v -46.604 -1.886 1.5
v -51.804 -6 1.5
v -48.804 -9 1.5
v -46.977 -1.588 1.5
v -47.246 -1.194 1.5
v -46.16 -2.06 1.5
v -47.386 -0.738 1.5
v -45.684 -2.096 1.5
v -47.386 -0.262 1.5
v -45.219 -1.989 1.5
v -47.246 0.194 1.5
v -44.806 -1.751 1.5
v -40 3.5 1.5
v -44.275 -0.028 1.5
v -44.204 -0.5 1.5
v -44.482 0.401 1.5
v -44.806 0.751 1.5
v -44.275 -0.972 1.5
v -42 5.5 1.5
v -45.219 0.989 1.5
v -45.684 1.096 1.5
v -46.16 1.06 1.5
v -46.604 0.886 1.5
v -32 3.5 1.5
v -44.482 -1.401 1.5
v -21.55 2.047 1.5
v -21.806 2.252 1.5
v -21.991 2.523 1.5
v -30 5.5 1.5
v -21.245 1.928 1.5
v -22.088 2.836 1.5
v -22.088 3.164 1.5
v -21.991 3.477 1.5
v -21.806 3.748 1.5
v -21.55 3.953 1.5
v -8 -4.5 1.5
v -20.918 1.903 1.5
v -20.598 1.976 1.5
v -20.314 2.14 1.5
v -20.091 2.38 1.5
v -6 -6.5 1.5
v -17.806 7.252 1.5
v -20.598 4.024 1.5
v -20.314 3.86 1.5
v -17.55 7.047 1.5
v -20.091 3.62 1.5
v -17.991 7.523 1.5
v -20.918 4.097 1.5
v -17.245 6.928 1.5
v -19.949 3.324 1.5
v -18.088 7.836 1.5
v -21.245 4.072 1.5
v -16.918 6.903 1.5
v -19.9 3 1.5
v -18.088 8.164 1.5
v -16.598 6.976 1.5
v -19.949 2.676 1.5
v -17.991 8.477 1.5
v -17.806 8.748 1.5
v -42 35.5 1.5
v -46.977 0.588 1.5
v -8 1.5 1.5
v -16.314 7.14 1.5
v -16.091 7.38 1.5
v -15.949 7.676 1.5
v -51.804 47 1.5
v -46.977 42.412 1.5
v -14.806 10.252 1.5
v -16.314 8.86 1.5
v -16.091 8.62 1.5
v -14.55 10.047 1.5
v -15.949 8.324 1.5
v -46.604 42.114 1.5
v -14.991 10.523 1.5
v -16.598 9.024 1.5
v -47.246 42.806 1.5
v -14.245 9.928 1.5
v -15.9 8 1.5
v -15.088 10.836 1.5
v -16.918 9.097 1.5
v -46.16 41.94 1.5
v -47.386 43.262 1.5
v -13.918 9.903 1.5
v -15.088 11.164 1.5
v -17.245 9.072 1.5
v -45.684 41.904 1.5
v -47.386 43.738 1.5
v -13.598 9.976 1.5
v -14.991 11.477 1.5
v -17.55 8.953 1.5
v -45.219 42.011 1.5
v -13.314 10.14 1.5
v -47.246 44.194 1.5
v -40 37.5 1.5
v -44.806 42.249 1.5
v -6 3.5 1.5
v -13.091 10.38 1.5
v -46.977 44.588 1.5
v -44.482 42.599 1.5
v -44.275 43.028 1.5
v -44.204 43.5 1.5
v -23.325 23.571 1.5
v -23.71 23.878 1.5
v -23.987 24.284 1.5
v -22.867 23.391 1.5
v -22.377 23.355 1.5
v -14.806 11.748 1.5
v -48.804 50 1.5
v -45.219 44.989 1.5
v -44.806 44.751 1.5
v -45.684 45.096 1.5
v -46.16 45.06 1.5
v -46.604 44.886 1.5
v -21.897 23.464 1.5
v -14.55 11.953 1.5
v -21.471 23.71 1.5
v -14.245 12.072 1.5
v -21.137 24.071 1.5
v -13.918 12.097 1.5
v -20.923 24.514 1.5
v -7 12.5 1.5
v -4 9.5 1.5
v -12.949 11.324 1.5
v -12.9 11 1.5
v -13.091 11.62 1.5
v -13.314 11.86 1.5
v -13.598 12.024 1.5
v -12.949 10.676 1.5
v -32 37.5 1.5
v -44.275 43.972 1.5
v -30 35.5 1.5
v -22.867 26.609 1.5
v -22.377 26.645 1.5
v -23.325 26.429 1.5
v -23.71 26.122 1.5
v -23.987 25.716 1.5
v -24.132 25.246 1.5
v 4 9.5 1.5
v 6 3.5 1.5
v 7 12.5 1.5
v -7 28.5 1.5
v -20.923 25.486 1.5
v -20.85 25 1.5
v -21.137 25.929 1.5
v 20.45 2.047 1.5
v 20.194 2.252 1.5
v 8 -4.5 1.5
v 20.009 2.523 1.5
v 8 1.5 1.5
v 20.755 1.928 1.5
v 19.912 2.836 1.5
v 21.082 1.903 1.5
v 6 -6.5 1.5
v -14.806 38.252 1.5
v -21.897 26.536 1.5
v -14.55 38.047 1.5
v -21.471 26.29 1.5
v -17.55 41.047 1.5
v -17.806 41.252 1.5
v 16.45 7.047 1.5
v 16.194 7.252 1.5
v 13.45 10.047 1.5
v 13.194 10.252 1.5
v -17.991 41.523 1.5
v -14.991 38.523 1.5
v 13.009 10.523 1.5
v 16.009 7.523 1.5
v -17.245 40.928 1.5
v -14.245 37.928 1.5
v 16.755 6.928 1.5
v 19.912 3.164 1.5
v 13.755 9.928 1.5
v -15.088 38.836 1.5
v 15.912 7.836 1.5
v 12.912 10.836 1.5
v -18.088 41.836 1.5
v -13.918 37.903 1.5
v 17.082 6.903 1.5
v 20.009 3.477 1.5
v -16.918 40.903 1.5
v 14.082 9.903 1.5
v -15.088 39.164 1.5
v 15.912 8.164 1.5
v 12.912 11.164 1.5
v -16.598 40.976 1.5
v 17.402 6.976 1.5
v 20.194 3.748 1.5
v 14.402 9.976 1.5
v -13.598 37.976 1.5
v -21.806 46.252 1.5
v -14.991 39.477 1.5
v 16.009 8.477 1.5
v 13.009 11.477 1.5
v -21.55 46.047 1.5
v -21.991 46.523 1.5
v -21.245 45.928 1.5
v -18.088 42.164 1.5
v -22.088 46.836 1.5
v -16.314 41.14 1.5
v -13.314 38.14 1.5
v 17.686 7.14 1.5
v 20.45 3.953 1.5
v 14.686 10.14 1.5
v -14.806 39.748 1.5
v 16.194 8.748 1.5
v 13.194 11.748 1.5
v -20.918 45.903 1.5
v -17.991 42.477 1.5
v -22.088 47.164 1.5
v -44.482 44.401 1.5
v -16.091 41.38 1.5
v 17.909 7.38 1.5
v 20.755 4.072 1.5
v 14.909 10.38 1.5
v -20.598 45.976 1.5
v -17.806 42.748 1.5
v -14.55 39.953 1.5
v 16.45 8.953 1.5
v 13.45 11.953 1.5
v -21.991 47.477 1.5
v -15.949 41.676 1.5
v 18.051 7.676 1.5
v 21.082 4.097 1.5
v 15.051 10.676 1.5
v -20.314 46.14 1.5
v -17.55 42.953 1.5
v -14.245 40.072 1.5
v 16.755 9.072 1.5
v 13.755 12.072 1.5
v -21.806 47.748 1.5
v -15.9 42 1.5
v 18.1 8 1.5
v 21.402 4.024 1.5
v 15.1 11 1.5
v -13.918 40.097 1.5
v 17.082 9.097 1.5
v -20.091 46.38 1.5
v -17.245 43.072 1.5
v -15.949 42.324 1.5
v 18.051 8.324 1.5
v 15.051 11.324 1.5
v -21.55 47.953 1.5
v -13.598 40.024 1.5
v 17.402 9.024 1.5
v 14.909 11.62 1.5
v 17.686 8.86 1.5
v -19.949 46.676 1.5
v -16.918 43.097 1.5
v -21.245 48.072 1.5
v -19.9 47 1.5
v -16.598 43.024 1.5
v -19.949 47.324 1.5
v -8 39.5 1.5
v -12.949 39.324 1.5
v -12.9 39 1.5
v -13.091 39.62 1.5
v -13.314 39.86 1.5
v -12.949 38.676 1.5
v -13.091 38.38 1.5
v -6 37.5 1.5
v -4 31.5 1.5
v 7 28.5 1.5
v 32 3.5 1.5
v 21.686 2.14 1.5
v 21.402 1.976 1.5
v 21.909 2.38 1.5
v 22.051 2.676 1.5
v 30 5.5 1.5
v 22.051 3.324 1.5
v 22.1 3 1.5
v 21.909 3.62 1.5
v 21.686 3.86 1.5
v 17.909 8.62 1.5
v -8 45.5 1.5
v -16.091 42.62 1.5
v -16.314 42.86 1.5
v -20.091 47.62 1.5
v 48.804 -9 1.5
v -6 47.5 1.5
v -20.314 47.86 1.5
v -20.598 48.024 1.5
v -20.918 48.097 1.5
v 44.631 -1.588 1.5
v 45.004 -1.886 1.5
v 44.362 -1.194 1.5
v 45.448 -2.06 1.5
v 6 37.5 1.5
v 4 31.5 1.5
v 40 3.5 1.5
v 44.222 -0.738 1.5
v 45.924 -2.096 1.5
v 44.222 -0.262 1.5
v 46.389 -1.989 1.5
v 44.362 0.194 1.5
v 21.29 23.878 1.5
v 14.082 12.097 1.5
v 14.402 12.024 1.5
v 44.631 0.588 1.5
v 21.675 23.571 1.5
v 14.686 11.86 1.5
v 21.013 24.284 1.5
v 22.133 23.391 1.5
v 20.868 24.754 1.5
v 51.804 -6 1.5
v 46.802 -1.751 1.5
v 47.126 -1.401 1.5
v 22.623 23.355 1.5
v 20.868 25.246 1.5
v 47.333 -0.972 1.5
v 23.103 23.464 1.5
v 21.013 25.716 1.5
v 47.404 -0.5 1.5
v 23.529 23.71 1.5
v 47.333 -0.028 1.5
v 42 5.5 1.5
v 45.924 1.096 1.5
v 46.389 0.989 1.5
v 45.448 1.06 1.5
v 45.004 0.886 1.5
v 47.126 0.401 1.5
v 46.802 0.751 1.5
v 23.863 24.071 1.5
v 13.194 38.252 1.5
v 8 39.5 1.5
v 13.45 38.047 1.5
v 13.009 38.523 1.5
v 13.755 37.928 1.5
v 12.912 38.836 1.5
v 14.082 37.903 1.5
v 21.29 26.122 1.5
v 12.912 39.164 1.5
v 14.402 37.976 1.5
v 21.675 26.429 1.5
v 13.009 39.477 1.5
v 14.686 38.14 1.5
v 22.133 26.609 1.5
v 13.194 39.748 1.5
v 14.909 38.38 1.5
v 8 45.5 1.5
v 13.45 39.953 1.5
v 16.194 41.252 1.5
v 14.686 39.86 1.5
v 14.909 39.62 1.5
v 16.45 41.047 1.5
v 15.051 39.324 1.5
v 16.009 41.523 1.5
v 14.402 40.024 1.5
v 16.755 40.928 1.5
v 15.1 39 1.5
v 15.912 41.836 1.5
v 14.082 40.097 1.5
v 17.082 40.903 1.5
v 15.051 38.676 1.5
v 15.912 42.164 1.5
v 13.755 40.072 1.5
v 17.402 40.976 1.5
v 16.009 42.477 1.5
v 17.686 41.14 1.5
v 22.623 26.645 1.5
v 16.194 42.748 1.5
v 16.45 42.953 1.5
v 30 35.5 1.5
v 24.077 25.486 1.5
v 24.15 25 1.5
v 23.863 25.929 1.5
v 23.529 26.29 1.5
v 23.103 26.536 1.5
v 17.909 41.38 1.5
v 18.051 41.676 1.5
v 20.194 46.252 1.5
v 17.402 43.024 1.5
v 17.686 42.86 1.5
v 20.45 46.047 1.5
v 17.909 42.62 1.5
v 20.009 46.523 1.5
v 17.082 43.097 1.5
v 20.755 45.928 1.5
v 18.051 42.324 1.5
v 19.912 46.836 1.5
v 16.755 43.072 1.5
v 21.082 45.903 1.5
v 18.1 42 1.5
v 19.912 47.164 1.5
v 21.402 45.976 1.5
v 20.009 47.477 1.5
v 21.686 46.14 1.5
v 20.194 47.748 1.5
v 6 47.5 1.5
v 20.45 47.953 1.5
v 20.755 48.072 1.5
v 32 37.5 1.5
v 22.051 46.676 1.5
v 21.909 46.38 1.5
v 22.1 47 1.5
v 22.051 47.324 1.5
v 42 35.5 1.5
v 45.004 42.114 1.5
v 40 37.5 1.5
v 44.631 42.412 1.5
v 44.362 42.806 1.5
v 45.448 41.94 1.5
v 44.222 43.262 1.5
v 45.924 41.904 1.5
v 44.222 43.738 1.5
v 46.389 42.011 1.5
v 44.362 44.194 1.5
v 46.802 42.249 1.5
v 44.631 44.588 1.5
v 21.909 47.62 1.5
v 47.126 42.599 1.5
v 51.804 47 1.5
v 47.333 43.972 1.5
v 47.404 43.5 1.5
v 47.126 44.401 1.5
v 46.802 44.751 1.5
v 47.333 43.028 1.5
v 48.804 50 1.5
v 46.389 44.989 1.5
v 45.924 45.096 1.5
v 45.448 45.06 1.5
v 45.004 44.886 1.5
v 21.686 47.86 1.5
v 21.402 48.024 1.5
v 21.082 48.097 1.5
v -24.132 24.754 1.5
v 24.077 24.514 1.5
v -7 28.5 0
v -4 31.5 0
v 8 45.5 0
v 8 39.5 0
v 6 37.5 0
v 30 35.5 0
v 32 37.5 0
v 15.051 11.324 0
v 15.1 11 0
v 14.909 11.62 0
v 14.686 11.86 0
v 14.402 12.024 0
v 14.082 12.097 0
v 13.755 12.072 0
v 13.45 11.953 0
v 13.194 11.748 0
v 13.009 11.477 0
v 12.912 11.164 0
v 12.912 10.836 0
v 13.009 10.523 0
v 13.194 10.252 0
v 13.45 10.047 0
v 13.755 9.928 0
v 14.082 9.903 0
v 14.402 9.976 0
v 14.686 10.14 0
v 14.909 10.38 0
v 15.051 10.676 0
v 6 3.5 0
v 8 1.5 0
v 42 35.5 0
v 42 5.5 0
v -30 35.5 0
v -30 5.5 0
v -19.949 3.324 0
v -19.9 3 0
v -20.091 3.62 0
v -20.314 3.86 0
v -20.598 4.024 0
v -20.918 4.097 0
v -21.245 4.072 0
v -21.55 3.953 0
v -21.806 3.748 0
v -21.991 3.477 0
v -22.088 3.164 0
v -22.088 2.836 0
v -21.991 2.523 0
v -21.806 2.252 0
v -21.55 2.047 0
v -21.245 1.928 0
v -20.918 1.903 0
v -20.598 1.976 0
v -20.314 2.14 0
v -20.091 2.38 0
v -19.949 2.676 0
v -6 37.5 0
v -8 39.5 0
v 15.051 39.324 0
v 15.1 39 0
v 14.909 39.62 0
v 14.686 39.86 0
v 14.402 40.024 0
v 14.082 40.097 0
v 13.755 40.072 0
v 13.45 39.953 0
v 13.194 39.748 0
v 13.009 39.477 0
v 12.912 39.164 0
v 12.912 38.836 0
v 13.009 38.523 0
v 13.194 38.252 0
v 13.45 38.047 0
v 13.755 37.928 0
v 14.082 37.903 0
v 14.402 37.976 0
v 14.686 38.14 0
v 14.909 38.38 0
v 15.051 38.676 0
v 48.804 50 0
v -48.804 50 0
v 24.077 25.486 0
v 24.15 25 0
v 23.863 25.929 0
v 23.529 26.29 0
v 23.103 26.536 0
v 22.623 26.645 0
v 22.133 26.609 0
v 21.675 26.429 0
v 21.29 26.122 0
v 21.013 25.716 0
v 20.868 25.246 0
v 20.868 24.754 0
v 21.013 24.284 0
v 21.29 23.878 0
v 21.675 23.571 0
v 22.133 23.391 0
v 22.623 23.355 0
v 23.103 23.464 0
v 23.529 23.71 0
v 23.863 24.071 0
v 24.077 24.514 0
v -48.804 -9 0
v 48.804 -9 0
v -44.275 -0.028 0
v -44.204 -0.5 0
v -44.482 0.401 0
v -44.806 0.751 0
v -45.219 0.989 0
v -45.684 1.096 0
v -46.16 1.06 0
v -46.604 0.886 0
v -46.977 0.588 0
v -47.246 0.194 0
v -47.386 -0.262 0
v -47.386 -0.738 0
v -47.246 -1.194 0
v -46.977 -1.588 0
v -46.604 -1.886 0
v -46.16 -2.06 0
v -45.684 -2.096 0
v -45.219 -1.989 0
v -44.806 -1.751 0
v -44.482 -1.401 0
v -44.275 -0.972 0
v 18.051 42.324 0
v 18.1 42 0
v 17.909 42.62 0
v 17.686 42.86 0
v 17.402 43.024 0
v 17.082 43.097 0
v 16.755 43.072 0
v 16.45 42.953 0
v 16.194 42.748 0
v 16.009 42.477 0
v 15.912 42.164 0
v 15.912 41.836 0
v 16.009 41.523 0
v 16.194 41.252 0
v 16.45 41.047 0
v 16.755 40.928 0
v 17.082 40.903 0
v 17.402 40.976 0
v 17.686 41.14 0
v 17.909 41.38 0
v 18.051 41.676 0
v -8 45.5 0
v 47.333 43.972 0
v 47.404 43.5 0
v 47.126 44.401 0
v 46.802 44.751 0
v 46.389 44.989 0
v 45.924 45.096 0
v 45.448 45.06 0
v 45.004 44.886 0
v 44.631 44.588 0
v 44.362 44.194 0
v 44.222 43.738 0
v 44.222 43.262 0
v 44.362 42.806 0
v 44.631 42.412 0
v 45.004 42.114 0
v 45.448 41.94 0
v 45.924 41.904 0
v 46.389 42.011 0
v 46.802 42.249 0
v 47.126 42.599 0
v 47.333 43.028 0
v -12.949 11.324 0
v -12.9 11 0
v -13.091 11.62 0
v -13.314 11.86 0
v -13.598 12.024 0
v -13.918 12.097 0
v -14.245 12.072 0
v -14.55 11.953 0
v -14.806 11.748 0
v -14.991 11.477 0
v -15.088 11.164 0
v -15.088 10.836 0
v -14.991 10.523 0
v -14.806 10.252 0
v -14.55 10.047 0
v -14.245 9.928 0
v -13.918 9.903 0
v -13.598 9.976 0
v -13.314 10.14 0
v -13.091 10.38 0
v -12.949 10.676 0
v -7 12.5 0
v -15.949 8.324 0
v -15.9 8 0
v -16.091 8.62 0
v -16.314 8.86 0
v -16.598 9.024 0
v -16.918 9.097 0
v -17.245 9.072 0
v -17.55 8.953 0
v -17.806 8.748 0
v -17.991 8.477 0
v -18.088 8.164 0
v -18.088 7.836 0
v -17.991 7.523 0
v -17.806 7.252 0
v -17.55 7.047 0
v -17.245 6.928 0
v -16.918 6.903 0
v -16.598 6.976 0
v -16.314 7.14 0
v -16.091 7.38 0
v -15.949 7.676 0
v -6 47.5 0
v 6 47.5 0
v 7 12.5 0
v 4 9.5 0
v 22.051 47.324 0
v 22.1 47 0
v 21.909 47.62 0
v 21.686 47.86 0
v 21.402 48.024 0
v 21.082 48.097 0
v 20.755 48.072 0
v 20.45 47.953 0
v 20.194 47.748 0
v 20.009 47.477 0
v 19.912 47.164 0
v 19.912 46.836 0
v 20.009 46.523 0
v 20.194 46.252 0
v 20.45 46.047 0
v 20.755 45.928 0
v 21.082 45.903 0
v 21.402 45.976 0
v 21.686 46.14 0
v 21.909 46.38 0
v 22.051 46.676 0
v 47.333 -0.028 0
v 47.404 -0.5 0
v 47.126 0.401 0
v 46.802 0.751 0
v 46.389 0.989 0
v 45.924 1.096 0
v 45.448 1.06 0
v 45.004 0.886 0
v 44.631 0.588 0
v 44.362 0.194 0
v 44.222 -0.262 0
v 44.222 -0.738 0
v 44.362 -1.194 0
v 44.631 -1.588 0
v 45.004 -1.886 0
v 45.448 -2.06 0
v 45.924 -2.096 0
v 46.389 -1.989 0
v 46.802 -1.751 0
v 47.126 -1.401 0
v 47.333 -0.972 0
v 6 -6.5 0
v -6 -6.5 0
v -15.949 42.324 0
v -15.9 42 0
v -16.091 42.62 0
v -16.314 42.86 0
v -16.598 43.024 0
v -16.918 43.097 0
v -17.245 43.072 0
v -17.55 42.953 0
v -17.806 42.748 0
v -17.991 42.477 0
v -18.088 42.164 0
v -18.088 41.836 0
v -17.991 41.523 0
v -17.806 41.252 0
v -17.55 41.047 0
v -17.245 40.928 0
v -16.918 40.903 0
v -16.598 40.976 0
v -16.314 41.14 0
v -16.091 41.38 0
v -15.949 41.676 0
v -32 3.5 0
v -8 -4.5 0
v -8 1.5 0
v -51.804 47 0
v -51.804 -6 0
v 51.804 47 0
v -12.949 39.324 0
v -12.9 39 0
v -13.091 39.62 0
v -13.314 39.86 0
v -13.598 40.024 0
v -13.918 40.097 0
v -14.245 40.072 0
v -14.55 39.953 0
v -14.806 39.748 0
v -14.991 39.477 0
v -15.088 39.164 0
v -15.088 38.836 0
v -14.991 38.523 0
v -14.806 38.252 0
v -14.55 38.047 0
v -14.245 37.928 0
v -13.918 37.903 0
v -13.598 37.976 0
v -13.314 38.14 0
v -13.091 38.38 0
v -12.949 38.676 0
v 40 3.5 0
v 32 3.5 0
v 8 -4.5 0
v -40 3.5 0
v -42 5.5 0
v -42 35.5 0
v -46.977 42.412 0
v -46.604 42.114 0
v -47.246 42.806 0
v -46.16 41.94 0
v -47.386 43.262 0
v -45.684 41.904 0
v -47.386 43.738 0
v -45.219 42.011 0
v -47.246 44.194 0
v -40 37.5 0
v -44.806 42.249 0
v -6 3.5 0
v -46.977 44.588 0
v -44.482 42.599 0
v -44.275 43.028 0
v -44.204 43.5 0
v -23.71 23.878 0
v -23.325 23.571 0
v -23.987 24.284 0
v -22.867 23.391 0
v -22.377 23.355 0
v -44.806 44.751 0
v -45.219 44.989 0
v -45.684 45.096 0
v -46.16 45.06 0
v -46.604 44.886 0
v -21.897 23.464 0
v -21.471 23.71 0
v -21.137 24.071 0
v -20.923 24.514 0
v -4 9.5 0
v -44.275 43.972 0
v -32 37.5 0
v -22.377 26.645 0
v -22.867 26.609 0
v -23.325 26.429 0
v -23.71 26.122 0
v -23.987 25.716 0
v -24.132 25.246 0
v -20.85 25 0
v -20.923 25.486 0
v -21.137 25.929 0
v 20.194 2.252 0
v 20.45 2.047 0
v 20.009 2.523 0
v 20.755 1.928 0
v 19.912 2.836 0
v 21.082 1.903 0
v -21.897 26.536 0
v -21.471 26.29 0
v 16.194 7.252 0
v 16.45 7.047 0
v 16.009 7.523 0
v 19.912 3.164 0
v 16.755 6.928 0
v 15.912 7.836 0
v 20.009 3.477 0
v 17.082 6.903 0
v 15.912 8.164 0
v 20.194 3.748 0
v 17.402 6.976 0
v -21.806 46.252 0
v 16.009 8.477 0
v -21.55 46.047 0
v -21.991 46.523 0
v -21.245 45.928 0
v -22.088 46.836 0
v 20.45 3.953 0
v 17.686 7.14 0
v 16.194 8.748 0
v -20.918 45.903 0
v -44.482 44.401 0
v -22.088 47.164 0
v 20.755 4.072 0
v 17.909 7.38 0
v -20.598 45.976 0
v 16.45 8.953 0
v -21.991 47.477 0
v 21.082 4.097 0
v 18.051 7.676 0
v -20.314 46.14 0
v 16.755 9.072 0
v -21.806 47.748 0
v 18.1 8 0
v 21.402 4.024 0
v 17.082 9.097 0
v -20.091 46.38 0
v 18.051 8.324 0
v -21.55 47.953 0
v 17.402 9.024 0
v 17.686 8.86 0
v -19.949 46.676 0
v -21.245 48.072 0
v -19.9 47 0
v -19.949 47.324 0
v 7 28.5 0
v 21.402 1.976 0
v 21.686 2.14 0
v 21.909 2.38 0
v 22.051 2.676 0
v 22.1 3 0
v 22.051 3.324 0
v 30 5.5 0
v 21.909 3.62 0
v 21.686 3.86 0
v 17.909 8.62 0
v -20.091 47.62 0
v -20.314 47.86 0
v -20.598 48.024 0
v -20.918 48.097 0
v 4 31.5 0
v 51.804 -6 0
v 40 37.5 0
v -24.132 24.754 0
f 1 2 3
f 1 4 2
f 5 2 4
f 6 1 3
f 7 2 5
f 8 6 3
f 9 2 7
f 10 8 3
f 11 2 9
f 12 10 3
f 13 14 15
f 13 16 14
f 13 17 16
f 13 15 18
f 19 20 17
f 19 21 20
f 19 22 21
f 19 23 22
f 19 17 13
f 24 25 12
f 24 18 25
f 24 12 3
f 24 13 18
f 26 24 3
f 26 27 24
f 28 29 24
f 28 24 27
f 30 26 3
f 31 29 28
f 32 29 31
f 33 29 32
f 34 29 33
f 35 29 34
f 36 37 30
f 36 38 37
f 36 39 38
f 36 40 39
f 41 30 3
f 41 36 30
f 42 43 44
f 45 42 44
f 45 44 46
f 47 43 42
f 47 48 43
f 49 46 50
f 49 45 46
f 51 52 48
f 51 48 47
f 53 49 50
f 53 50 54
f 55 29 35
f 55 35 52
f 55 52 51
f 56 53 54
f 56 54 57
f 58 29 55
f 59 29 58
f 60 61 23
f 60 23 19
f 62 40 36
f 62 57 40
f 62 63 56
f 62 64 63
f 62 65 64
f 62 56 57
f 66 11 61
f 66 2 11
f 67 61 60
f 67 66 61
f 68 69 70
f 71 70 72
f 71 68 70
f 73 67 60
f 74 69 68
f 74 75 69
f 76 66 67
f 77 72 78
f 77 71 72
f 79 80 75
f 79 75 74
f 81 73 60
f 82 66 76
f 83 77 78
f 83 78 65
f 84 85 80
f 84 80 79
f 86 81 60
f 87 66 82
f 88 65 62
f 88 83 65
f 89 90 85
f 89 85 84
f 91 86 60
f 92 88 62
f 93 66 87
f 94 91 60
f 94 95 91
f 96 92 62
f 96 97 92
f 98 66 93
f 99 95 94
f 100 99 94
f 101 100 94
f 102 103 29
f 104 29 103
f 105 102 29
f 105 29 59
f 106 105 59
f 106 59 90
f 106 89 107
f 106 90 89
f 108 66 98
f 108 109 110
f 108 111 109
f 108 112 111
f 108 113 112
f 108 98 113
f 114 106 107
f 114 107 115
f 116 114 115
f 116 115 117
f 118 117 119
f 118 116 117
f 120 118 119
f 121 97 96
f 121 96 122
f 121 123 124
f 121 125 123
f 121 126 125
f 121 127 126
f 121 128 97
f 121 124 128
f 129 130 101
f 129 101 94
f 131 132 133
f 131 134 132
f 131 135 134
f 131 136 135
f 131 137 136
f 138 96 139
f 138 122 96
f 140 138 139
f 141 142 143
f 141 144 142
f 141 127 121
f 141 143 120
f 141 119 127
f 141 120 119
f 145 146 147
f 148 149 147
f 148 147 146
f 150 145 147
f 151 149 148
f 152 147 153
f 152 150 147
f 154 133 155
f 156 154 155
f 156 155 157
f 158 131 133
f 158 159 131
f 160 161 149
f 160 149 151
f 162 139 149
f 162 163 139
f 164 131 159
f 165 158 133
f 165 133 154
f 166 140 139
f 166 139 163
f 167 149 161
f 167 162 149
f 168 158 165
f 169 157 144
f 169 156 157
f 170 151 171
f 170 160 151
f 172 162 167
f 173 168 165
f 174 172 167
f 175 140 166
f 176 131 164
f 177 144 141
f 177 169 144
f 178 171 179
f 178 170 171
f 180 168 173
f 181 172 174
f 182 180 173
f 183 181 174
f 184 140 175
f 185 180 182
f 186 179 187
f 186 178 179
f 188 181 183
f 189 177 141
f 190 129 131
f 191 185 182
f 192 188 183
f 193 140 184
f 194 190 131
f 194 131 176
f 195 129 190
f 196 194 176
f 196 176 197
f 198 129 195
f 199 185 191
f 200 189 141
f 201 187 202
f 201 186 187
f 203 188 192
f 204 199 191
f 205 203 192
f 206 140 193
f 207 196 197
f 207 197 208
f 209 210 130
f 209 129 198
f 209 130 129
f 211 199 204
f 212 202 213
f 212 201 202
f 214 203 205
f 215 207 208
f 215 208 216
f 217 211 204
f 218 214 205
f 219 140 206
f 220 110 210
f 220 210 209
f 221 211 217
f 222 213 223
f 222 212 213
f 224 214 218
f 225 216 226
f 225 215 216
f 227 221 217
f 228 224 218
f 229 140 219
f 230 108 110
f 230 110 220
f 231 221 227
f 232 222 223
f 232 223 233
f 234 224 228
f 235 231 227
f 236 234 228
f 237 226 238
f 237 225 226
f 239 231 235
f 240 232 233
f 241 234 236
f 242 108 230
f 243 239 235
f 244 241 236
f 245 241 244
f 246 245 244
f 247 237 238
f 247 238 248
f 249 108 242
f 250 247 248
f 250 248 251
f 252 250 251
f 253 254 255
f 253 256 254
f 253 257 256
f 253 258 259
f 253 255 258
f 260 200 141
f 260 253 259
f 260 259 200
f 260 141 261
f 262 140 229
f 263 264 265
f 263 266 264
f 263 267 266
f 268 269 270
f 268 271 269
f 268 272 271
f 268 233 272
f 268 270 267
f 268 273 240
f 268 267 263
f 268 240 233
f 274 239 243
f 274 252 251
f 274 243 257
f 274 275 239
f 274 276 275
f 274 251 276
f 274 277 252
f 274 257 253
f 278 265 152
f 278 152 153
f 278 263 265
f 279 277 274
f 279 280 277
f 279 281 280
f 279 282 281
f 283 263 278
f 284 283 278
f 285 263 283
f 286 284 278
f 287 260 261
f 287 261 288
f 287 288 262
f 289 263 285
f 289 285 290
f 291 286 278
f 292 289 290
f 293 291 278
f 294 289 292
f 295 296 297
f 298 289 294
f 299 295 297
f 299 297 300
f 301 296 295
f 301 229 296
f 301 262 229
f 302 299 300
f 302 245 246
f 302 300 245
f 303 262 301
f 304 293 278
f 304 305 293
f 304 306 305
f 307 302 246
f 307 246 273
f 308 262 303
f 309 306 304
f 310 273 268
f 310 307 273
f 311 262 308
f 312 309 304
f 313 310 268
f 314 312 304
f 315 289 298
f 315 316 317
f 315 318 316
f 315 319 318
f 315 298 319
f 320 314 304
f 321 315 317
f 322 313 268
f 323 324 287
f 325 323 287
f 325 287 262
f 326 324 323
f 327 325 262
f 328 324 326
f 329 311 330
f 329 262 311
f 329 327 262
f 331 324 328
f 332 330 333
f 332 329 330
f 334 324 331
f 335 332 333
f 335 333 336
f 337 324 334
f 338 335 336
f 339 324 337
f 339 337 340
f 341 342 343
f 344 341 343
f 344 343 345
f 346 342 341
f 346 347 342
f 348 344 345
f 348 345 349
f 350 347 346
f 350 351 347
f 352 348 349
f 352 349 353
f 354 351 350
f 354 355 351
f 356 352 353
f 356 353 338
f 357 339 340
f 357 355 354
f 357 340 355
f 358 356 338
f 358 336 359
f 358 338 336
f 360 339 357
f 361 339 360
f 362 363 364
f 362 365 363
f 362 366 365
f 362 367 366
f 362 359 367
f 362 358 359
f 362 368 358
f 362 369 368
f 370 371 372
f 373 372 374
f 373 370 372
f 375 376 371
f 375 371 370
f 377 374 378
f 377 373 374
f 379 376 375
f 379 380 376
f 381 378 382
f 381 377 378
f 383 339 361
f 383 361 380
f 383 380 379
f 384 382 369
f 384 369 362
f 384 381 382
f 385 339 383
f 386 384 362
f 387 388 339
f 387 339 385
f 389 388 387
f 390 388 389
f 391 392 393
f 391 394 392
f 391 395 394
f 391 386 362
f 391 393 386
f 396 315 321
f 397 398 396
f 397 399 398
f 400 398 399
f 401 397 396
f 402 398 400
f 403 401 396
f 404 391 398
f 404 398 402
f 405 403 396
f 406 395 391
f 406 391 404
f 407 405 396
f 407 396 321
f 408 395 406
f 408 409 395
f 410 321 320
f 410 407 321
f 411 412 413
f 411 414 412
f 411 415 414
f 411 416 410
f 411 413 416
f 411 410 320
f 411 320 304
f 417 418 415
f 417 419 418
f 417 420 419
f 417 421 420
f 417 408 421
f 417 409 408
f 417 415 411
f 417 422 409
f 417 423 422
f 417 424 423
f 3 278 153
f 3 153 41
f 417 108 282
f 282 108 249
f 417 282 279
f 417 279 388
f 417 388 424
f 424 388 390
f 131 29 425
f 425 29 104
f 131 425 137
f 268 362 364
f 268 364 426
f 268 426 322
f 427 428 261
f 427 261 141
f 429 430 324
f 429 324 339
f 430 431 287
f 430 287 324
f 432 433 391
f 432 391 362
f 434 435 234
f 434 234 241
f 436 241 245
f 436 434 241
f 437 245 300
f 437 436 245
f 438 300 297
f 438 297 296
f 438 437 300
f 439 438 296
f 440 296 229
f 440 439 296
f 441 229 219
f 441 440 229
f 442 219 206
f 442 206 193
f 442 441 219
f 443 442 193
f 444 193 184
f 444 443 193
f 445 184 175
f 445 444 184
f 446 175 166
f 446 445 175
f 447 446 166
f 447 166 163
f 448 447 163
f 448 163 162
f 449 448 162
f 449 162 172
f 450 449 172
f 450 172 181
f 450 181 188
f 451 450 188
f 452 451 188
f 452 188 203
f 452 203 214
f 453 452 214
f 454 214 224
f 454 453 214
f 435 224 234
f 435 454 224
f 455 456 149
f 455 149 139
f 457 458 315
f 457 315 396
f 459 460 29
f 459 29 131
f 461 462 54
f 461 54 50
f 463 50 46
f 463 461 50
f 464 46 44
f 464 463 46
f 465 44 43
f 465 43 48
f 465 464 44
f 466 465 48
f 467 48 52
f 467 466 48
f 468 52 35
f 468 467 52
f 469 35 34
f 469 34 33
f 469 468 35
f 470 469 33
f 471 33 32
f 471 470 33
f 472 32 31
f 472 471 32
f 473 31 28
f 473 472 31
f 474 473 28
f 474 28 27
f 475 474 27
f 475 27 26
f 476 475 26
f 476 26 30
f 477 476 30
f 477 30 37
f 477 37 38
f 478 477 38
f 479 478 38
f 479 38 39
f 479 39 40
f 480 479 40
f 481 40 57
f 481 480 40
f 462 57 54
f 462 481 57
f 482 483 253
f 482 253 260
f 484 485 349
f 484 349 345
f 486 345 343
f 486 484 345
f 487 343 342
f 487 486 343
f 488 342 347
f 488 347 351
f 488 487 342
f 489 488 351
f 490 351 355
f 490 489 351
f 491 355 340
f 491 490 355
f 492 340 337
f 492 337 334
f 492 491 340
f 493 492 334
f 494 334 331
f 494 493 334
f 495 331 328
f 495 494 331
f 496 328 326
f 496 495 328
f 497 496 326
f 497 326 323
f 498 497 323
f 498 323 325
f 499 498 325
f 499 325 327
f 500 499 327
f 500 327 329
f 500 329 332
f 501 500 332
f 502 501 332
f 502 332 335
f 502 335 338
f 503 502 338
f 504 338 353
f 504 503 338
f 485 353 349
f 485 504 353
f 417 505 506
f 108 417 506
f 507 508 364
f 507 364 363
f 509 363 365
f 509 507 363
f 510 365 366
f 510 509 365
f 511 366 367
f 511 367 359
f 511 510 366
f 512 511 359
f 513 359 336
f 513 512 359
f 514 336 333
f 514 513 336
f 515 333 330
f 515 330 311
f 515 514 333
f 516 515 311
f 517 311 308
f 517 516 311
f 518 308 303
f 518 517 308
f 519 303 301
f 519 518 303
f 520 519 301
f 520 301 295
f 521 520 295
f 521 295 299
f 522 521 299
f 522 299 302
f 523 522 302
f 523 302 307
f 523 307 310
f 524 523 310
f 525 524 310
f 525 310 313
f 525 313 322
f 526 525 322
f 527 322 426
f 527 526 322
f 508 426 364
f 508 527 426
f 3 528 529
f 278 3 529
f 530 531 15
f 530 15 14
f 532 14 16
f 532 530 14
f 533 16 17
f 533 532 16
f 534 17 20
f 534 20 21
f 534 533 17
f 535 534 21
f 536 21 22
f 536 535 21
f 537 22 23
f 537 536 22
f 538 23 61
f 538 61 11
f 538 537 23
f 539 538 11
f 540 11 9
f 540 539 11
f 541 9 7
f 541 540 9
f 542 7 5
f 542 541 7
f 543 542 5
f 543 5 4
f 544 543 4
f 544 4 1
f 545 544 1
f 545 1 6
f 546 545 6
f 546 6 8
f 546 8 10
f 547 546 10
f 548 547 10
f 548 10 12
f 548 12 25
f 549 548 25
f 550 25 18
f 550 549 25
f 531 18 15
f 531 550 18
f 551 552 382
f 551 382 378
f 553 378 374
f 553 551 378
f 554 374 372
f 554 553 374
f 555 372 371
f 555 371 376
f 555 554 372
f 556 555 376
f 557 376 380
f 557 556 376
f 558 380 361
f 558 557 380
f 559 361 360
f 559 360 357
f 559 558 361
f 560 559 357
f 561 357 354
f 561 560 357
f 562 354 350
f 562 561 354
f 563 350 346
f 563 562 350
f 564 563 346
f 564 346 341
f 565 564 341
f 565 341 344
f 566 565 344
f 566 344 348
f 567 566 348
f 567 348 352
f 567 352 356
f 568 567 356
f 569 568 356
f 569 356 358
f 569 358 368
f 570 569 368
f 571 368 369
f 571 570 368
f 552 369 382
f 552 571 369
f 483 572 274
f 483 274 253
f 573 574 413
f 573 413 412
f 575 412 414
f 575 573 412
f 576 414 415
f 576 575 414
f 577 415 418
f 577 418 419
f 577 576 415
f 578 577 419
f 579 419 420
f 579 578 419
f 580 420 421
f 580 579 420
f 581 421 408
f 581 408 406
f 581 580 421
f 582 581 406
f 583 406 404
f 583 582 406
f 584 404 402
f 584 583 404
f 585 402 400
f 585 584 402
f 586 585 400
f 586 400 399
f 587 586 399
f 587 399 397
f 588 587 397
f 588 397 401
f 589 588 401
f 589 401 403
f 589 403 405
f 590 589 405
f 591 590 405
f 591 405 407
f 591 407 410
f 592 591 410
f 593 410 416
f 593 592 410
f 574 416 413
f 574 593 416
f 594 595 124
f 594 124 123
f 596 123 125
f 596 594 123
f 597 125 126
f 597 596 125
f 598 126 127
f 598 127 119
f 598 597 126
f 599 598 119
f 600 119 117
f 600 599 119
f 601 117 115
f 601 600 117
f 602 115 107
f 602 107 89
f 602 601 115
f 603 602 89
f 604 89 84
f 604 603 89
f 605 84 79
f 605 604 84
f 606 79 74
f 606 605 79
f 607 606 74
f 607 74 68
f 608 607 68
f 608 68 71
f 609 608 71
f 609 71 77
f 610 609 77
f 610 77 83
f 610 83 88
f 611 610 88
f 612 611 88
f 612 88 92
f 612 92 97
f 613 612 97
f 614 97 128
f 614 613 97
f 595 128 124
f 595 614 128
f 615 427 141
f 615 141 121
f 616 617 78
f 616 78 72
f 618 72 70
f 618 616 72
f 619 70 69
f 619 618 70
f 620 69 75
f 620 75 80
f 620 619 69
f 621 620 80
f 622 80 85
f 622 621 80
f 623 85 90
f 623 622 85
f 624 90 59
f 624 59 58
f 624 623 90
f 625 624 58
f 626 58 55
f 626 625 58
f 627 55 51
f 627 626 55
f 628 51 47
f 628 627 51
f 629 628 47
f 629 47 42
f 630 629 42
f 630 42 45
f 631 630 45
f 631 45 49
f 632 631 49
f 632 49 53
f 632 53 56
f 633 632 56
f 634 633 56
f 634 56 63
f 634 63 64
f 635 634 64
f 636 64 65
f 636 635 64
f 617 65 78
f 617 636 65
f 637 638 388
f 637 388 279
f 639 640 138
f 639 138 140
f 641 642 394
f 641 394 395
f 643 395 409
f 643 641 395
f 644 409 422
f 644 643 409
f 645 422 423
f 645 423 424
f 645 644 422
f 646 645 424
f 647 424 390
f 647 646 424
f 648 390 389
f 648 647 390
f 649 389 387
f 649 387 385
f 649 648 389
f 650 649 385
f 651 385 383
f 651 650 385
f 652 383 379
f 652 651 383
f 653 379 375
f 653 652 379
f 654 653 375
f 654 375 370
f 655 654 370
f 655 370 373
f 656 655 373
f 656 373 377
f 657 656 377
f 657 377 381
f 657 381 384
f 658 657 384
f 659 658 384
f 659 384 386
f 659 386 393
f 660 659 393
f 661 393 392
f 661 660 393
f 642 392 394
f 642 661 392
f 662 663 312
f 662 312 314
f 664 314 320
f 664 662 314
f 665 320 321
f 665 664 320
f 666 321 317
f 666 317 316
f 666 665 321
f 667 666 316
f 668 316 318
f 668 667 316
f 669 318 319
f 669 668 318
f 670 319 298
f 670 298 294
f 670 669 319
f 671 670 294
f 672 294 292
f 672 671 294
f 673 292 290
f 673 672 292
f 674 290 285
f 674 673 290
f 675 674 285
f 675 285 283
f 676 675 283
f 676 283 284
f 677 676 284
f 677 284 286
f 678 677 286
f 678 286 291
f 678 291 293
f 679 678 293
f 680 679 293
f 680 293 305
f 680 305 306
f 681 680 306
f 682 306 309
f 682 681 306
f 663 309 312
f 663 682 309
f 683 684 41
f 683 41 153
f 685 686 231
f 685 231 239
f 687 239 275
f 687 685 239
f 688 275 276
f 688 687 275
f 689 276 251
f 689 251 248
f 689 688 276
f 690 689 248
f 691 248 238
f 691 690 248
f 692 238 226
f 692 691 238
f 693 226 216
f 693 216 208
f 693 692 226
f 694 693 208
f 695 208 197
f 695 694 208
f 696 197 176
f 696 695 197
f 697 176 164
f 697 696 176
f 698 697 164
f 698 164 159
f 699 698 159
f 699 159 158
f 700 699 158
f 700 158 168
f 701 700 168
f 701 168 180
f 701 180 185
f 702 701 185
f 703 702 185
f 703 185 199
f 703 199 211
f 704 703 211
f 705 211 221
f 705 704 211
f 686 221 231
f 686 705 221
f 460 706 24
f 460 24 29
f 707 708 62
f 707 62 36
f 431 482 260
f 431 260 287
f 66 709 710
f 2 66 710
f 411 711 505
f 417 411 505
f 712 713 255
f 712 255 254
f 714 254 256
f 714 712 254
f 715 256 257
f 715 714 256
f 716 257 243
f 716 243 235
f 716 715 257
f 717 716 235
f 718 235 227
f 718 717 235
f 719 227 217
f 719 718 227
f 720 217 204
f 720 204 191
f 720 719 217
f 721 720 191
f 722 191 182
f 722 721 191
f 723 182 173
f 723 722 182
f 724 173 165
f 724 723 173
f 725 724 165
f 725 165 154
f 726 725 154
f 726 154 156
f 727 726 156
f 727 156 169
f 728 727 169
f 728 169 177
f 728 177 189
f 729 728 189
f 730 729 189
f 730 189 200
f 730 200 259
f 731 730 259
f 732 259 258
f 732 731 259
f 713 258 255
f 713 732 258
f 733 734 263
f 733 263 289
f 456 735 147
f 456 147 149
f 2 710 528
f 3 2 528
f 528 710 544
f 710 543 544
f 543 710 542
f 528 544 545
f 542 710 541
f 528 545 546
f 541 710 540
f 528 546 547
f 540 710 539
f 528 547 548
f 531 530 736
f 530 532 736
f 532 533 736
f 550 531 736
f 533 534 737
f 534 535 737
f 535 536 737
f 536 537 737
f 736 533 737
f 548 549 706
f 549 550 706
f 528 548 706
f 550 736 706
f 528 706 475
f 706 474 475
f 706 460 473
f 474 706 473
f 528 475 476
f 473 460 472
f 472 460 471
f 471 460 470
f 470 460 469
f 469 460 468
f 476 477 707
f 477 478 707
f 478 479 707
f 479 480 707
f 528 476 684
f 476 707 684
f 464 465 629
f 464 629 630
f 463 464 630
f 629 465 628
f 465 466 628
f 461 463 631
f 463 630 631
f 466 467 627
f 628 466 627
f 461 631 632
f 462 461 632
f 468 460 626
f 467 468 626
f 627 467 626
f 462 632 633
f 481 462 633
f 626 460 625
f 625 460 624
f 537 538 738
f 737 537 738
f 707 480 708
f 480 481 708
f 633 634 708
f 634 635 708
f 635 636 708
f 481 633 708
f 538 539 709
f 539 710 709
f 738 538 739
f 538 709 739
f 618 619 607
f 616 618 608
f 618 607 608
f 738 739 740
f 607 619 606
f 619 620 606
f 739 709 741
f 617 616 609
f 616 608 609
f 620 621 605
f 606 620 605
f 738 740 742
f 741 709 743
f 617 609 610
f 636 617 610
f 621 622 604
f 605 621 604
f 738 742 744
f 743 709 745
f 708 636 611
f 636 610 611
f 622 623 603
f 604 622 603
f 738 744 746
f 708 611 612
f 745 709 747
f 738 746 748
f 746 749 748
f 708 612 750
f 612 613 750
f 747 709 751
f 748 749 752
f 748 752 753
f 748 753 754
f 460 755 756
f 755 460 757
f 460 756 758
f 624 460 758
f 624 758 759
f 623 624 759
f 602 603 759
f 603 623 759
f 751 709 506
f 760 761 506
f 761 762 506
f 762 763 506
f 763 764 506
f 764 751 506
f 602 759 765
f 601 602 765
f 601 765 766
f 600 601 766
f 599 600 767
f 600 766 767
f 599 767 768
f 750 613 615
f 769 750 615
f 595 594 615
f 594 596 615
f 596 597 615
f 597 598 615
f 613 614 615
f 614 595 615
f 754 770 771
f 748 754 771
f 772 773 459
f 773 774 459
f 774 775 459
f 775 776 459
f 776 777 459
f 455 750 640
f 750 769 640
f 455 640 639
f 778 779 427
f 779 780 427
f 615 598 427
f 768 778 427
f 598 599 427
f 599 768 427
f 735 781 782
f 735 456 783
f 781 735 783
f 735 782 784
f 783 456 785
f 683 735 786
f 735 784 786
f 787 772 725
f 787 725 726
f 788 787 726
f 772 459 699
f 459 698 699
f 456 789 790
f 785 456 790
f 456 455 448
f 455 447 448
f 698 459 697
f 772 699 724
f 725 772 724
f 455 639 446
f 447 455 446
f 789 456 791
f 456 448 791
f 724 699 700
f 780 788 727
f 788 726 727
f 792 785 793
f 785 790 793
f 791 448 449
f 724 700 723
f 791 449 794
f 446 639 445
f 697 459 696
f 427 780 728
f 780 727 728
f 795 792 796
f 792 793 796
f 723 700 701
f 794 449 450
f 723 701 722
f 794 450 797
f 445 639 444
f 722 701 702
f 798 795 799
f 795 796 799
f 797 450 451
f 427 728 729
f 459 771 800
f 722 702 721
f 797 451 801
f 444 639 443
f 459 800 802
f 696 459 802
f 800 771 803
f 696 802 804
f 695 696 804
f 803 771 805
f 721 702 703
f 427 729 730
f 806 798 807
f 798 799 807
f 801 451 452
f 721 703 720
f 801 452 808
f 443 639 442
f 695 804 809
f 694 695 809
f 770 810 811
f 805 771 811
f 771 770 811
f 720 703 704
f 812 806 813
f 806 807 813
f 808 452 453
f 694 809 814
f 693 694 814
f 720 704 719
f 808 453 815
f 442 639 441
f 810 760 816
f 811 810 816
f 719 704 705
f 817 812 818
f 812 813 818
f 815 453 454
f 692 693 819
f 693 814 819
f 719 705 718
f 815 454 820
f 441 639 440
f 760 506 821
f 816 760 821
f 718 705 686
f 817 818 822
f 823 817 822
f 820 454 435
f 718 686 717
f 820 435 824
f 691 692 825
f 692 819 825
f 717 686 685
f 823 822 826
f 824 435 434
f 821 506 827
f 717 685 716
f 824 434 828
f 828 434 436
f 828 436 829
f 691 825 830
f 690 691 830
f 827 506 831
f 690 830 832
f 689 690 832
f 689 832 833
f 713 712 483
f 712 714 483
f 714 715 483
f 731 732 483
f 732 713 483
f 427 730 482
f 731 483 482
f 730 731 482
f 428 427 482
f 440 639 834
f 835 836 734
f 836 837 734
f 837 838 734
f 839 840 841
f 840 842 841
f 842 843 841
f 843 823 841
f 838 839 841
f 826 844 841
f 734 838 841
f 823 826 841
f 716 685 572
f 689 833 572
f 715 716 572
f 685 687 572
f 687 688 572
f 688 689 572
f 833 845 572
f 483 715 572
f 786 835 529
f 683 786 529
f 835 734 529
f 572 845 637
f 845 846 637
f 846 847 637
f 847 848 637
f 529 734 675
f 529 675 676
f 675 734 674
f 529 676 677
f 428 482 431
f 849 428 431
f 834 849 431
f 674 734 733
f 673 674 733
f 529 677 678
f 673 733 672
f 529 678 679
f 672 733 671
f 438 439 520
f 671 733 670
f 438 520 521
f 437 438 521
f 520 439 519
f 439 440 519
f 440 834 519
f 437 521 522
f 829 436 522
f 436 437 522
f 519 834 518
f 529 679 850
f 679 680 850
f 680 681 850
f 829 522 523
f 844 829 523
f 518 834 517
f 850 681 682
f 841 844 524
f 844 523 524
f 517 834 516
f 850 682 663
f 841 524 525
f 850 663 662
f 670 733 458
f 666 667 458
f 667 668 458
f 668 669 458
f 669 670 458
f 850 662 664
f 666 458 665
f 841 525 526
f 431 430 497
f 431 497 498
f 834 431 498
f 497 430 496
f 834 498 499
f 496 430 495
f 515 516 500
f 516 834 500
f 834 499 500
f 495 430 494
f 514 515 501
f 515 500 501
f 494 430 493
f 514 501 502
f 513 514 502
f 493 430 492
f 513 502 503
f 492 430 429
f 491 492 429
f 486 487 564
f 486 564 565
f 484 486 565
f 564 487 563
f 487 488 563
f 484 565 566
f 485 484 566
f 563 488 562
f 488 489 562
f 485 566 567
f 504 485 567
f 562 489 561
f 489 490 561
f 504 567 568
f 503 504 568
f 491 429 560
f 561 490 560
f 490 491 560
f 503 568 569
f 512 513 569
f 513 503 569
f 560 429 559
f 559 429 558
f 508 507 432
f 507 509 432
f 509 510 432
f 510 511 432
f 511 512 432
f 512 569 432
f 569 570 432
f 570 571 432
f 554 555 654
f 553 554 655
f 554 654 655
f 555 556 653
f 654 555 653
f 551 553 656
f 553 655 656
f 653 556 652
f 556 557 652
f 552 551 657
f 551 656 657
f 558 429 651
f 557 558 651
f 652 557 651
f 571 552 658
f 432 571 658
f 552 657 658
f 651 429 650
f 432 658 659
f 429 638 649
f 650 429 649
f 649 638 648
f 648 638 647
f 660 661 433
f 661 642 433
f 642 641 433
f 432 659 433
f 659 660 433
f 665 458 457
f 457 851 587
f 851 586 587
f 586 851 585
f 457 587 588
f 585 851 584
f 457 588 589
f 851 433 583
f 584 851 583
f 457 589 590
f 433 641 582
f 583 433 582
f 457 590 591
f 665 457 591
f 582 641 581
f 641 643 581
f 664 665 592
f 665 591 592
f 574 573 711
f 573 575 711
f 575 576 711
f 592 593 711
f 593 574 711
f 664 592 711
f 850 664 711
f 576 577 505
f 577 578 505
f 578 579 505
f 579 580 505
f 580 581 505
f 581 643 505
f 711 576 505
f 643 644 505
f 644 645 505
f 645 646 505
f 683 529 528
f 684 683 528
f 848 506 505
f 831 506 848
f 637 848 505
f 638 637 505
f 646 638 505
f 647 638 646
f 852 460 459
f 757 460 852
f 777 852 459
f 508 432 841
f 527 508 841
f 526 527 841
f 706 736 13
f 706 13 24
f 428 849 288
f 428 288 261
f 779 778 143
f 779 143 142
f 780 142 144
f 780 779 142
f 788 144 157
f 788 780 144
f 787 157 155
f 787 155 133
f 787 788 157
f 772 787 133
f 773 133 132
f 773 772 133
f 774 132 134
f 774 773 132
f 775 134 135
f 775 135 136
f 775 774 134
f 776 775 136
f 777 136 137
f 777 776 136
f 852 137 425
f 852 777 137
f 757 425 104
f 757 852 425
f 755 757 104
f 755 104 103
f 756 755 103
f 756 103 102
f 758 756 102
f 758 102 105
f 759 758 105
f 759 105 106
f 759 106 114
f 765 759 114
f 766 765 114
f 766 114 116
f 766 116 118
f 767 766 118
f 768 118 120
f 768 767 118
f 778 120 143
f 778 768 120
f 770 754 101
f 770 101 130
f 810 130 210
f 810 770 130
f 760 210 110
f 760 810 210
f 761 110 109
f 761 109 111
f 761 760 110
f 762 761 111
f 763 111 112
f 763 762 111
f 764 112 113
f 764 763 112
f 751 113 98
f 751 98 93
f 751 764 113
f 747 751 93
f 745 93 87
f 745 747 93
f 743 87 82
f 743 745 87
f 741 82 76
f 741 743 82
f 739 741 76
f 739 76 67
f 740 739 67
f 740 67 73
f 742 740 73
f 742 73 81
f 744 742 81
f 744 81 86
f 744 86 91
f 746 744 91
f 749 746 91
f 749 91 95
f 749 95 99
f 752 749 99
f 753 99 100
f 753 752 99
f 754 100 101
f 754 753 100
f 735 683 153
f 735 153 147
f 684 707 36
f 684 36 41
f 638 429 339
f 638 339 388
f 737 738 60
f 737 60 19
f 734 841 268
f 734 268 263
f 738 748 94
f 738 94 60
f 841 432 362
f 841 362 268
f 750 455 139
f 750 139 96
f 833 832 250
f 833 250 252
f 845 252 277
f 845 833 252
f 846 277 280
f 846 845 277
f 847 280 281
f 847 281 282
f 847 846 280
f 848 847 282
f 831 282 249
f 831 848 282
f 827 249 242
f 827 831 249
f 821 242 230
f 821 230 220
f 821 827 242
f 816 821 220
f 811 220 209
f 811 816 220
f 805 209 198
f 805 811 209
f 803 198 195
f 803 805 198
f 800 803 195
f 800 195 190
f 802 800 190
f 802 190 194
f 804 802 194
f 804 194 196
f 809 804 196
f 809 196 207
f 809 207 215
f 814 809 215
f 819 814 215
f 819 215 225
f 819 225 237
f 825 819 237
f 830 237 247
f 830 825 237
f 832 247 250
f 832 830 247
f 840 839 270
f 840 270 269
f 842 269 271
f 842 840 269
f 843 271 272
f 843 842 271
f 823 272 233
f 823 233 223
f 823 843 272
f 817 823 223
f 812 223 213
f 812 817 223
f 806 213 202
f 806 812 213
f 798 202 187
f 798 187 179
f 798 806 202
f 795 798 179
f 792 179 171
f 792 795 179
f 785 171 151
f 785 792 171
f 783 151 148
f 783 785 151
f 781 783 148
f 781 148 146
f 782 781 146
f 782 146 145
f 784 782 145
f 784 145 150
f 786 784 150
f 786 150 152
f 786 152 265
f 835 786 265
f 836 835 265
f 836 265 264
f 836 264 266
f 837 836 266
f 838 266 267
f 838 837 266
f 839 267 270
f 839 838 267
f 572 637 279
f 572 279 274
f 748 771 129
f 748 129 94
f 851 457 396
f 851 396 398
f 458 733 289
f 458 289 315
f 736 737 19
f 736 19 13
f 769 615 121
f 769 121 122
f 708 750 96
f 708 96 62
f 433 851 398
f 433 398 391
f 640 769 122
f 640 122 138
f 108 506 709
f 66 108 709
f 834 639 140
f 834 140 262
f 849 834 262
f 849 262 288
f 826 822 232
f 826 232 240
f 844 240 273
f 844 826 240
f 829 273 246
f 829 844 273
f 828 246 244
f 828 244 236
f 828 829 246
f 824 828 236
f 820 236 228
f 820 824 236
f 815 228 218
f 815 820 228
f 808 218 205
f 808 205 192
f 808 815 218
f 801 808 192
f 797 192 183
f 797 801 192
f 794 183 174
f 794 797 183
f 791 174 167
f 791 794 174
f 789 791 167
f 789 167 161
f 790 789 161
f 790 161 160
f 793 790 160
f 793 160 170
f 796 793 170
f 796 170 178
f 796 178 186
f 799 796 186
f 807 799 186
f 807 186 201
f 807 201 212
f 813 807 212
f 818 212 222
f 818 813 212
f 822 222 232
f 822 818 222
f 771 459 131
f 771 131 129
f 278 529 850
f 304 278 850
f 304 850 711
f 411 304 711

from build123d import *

# Parameters (mm, degrees)
SKETCH_1_R    = 1.6
SKETCH_1_R_2  = 1.1
SKETCH_1_R_3  = 1.65
F_1P5MM_DEPTH = 1.5
SKETCH_2_R    = 1.1
D2P2_DEPTH    = 1.5


with BuildPart() as part:
    # 草图1 → 1p5mm竖向开孔板_上下四孔 (new body)
    with BuildSketch(Plane.XY):
        Polygon((-48.804040507, -9), (48.804040507, -9), (51.804040507, -6), (51.804040507, 47), (48.804040507, 50), (-48.804040507, 50), (-51.804040507, 47), (-51.804040507, -6), align=None)
        with Locations((-45.804040507, -0.5)):
            Circle(SKETCH_1_R, mode=Mode.SUBTRACT)
        with Locations((-45.804040507, 43.5)):
            Circle(SKETCH_1_R, mode=Mode.SUBTRACT)
        with Locations((45.804040507, -0.5)):
            Circle(SKETCH_1_R, mode=Mode.SUBTRACT)
        with Locations((45.804040507, 43.5)):
            Circle(SKETCH_1_R, mode=Mode.SUBTRACT)
        with Locations((-21, 3)):
            Circle(SKETCH_1_R_2, mode=Mode.SUBTRACT)
        with Locations((21, 3)):
            Circle(SKETCH_1_R_2, mode=Mode.SUBTRACT)
        with Locations((-14, 11)):
            Circle(SKETCH_1_R_2, mode=Mode.SUBTRACT)
        with Locations((-14, 39)):
            Circle(SKETCH_1_R_2, mode=Mode.SUBTRACT)
        with Locations((14, 11)):
            Circle(SKETCH_1_R_2, mode=Mode.SUBTRACT)
        with Locations((14, 39)):
            Circle(SKETCH_1_R_2, mode=Mode.SUBTRACT)
        with Locations((-17, 8)):
            Circle(SKETCH_1_R_2, mode=Mode.SUBTRACT)
        with Locations((-17, 42)):
            Circle(SKETCH_1_R_2, mode=Mode.SUBTRACT)
        with Locations((17, 8)):
            Circle(SKETCH_1_R_2, mode=Mode.SUBTRACT)
        with Locations((17, 42)):
            Circle(SKETCH_1_R_2, mode=Mode.SUBTRACT)
        with Locations((-22.5, 25)):
            Circle(SKETCH_1_R_3, mode=Mode.SUBTRACT)
        with Locations((22.5, 25)):
            Circle(SKETCH_1_R_3, mode=Mode.SUBTRACT)
        Polygon((-4, 9.5), (4, 9.5), (7, 12.5), (7, 28.5), (4, 31.5), (-4, 31.5), (-7, 28.5), (-7, 12.5), align=None, mode=Mode.SUBTRACT)
        Polygon((-40, 3.5), (-32, 3.5), (-30, 5.5), (-30, 35.5), (-32, 37.5), (-40, 37.5), (-42, 35.5), (-42, 5.5), align=None, mode=Mode.SUBTRACT)
        Polygon((32, 3.5), (40, 3.5), (42, 5.5), (42, 35.5), (40, 37.5), (32, 37.5), (30, 35.5), (30, 5.5), align=None, mode=Mode.SUBTRACT)
        Polygon((-6, -6.5), (6, -6.5), (8, -4.5), (8, 1.5), (6, 3.5), (-6, 3.5), (-8, 1.5), (-8, -4.5), align=None, mode=Mode.SUBTRACT)
        Polygon((-6, 37.5), (6, 37.5), (8, 39.5), (8, 45.5), (6, 47.5), (-6, 47.5), (-8, 45.5), (-8, 39.5), align=None, mode=Mode.SUBTRACT)
    extrude(amount=F_1P5MM_DEPTH)

    # 草图2 → 上沿电池板钢索孔_D2p2 (cut)
    with BuildSketch(Plane.XY):
        with Locations((-21, 47)):
            Circle(SKETCH_2_R)
        with Locations((21, 47)):
            Circle(SKETCH_2_R)
    extrude(amount=D2P2_DEPTH, mode=Mode.SUBTRACT)


solid = part.part
